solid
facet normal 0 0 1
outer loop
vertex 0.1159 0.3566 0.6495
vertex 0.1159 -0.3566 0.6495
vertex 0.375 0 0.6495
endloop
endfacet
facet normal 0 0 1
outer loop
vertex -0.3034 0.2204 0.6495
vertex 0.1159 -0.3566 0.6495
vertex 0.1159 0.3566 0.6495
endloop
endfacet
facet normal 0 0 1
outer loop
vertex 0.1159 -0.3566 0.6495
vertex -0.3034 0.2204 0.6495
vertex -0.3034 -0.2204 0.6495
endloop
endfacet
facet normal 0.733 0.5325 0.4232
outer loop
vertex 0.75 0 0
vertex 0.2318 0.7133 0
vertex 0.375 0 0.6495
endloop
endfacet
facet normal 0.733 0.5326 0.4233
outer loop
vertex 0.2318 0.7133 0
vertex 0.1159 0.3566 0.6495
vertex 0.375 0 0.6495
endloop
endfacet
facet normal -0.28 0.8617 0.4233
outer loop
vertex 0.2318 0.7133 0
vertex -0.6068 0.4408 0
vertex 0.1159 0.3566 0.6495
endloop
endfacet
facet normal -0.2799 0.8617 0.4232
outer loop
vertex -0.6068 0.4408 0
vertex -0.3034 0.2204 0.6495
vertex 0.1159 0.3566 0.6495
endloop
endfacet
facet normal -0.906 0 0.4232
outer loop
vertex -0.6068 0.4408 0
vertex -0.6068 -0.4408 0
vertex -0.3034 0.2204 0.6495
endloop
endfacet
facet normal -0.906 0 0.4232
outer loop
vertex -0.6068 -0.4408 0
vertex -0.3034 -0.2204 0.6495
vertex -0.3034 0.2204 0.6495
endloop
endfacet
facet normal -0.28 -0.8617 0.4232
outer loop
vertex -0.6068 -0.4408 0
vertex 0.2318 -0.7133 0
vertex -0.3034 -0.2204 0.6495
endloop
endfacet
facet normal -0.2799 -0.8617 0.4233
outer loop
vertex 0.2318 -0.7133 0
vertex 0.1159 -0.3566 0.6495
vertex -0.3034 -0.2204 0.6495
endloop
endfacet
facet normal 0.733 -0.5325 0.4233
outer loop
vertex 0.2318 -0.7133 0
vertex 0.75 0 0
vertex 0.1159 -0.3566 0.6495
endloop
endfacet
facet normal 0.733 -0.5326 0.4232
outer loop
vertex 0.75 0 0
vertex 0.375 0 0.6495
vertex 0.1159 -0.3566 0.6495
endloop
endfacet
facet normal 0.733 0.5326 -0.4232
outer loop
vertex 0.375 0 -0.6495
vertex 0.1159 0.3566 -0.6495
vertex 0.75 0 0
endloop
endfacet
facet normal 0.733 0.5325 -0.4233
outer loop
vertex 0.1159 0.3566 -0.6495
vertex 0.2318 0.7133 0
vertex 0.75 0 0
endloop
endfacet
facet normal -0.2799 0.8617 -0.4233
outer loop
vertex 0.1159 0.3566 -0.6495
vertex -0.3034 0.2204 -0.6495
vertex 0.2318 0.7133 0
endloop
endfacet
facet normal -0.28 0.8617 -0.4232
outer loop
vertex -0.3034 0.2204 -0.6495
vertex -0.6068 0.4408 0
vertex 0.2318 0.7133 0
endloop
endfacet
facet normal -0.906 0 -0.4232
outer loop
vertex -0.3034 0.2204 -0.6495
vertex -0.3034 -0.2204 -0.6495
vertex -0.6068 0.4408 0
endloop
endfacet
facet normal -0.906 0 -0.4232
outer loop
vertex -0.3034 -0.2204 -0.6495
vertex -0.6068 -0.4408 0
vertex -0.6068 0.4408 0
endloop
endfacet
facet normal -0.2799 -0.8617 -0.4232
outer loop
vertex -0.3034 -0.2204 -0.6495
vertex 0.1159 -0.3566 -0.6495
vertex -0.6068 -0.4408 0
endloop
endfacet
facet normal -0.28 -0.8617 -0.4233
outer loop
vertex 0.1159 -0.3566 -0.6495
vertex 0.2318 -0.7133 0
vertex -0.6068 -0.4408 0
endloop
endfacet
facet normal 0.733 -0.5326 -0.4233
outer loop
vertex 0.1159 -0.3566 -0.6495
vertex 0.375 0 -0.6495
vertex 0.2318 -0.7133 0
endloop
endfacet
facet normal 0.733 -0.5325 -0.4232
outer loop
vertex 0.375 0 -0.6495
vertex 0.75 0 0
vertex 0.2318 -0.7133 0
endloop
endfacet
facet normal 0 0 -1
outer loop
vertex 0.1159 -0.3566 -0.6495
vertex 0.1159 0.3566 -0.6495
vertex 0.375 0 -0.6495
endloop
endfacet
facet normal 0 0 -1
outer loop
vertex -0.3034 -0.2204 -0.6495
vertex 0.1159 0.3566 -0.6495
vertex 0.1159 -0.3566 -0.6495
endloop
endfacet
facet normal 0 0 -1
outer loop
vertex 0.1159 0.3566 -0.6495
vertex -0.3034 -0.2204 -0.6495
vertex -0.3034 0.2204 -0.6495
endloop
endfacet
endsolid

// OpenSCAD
// file: ContourPoints.scad
// Contour points

ViolinContour_Num_Pts = 8;

// [x_offset,scale_x,scale_y,steps,height_z]
ViolinContourPoints_Scale_X =[
  [0.0,1.0]
  ,[1.0,1.0]
  ,[2.5,1.0]
  ,[4.0,1.0]
  ,[5.25,1.0]
  ,[7.5,1.0]
  ,[10.5,1.0]
  ,[13.25,1.0]
];

function get_contour_scale_x(x) = lookup(x,ViolinContourPoints_Scale_X);

ViolinContourPoints_Scale_Y =[
  [0.0,1.0]
  ,[1.0,0.6]
  ,[2.5,0.6]
  ,[4.0,0.6]
  ,[5.25,0.6]
  ,[7.5,0.5]
  ,[10.5,0.4]
  ,[13.25,0.35]
];

function get_contour_scale_y(x) = lookup(x,ViolinContourPoints_Scale_Y);

ViolinContourPoints_Steps =[
  [0.0,8]
  ,[1.0,8]
  ,[2.5,8]
  ,[4.0,8]
  ,[5.25,8]
  ,[7.5,8]
  ,[10.5,16]
  ,[13.25,16]
];

function get_contour_steps(x) = round( lookup(x,ViolinContourPoints_Steps) );

ViolinContourPoints_Z_Height =[
  [0.0,0.25]
  ,[1.0,0.5]
  ,[2.5,0.7]
  ,[4.0,0.9]
  ,[5.25,1.1]
  ,[7.5,1.3]
  ,[10.5,1.5]
  ,[13.25,1.55]
];

function get_contour_z_height(x) = lookup(x,ViolinContourPoints_Z_Height);
// file: FHolePoints.scad
// F-Hole polynomial points;

FHole_Num_Pts = 69;
FHole = [
 [0,3.5] ,[0.05,3.3] ,[0.1,3.25] ,[0.2,3.15] ,[0.3,3.1] ,[0.4,3.05] ,[0.45,3.0] ,[0.60,3.25] ,[0.45,3.5] ,[1.2,3.8] 
,[1.4,3.5] ,[1.5,3.0] ,[1.6,2.5] ,[1.5,2.0]
,[1.45,1.5] ,[1.4,1.0] ,[1.35,0.5] ,[1.3,0.25] ,[1.2,0] ,[1.3,-0.25] ,[1.3,-0.5] ,[1.4,-1.0] ,[1.45,-1.5] ,[1.5,-2.0]
,[1.7,-2.5] ,[2.0,-3.0] ,[2.25,-3.2] ,[2.5,-3.5] ,[2.75,-3.6] ,[3.0,-3.5] ,[3.25,-3.4] ,[3.5,-3.25] ,[3.8,-3.0] ,[4.0,-2.5]
,[3.8,-2.25] ,[3.75,-2.1] ,[3.5,-1.9] ,[3.25,-2.1] ,[3.1,-2.3] ,[3.25,-2.8] ,[2.6,-3.4] ,[2.4,-3.0] ,[2.0,-2.3] ,[1.9,-2.0]
,[1.9,-1.5] ,[1.95,-1.0] ,[2.0,-0.5] ,[2.0,0.1] ,[2.2,0.3] ,[2.1,0.5] ,[2.05,0.55] ,[2.1,0.6] ,[2.15,1.0] ,[2.2,1.5]
,[2.15,2.0] ,[2.1,2.5] ,[2.0,3.0] ,[1.8,3.25] ,[1.7,3.4] ,[1.6,3.6] ,[1.5,3.75] ,[1.25,3.9] ,[1.0,3.95] ,[0.75,4.0]
,[0.6,3.95] ,[0.5,3.9] ,[0.4,3.85], [0.3,3.8] ,[0.25,3.75]
];
// file: StradPoints.scad
// Dataset copied with permission from the paper "On the Shape of a Violin", by R.J. Stroeker
// See http://www.stroeker.nl/publications.htm
//   - Stradpoints: http://www.stroeker.nl/StradPoints.pdf
// Note: All points are scale 1 unit = 1.0 cm = 10.0 mm

StradLower_Num_Pts = 44;
StradLower = [[0, 0], [0.0315332, 0.4829157], [0.0630664, 0.9869383], [0.0892593, 1.4856206], [.1836046, 2.4862911], [.2413307, 2.9849734], [.3239782, 3.4915390], [.4091687, 3.9917471], [.5452192, 4.4927181], [.6749122, 4.9916547], [.8458018, 5.4910999], [1.0439015, 5.9961397], [1.2796376, 6.4948220], [1.5580961, 6.9960473], [1.8726652, 7.4980355], [2.2836140, 7.9946834], [2.7708528, 8.5009947], [2.9778530, 8.6787504], [3.3796470, 9.0001856], [3.9851353, 9.3816356], [4.2244316, 9.5054797], [4.4896665, 9.6354270], [4.9903832, 9.8477675], [5.4549893, 10.0049249], [5.9869849, 10.1417383], [6.4871930, 10.2439669], [6.9812979, 10.3049989], [7.4764200, 10.3342434], [7.7279227, 10.3352606], [7.9812055, 10.3319547], [8.4875168, 10.2973699], [8.9938281, 10.2312519], [9.4955620, 10.1277518], [9.9515219, 10.0125539], [10.4959782, 9.8426815], [10.9880487, 9.6443275], [11.4806278, 9.4469907], [11.9861762, 9.2333787], [12.4807897, 9.0212925], [12.9863381, 8.8758329], [13.5524099, 8.8079348], [13.9938747, 8.8521830], [14.4724673, 9.0111205], [14.8249271, 9.2336330]];

StradC_Num_Pts = 29;
StradC = [[15.4128687, 8.8493857], [15.1397505, 8.5093866], [14.9813216, 8.1124243], [14.9609776, 8.0063812], [14.9480083, 7.7256340], [14.9752184, 7.5125306], [15.1400048, 7.0110510], [15.5003479, 6.5466992], [15.9934356, 6.2028856], [16.4972039, 5.9902908], [16.9897830, 5.8262673], [17.4945685, 5.7105608], [17.9975739, 5.6134182], [18.4952390, 5.5462830], [19.0015503, 5.5015262], [19.5009955, 5.4727903], [20.0062896, 5.4534635], [20.1975232, 5.4481232], [20.4968343, 5.4511748], [20.9944994, 5.4791478], [21.4921645, 5.5439943], [21.9877952, 5.6614809], [22.3918779, 5.8074491], [22.6988180, 6.0157208], [23.0098269, 6.5149117], [23.0543294, 6.8223604], [23.0428859, 7.0156284], [22.8346142, 7.5178709], [22.7944348, 7.5946695]];

StradUpper_Num_Pts = 40;
StradUpper = [[23.3900054, 7.8817742], [23.4960485, 7.7998896], [23.9934593, 7.5267714], [24.4453504, 7.4759114], [24.4984991, 7.4782001], [24.9987072, 7.5313488], [25.4994239, 7.6701966], [25.7132902, 7.7462323], [25.9968347, 7.8344744], [26.4955170, 7.9895974], [26.9952165, 8.1396344], [27.4923730, 8.2530522], [27.9961413, 8.3308680], [28.5042327, 8.3863054], [28.9525636, 8.4071580], [29.5059204, 8.3771506], [30.0061285, 8.3145928], [30.5073538, 8.2082954], [31.0047646, 8.0669046], [31.4986152, 7.8726194], [32.0031464, 7.6226425], [32.1638640, 7.5275343], [32.5061518, 7.3121422], [32.9163377, 7.0245289], [33.0155147, 6.9423900], [33.5129255, 6.5281353], [34.0047417, 6.0264014], [34.1674937, 5.8338963], [34.4047556, 5.5264476], [34.7383972, 5.0287825], [35.0168557, 4.5211997], [35.2345365, 4.0220088], [35.4234814, 3.5245980], [35.5768243, 3.0236270], [35.6971082, 2.5213845], [35.7784842, 2.0234651], [35.8412963, 1.5191882], [35.8725752, 1.0217774], [35.8774069, 0.9414186], [35.8974966, 0]];

// All Points
StradAll_Num_Pts = StradLower_Num_Pts + StradC_Num_Pts + StradUpper_Num_Pts;
StradAll = [[0, 0], [0.0315332, 0.4829157], [0.0630664, 0.9869383], [0.0892593, 1.4856206], [.1836046, 2.4862911], [.2413307, 2.9849734], [.3239782, 3.4915390], [.4091687, 3.9917471], [.5452192, 4.4927181], [.6749122, 4.9916547], [.8458018, 5.4910999], [1.0439015, 5.9961397], [1.2796376, 6.4948220], [1.5580961, 6.9960473], [1.8726652, 7.4980355], [2.2836140, 7.9946834], [2.7708528, 8.5009947], [2.9778530, 8.6787504], [3.3796470, 9.0001856], [3.9851353, 9.3816356], [4.2244316, 9.5054797], [4.4896665, 9.6354270], [4.9903832, 9.8477675], [5.4549893, 10.0049249], [5.9869849, 10.1417383], [6.4871930, 10.2439669], [6.9812979, 10.3049989], [7.4764200, 10.3342434], [7.7279227, 10.3352606], [7.9812055, 10.3319547], [8.4875168, 10.2973699], [8.9938281, 10.2312519], [9.4955620, 10.1277518], [9.9515219, 10.0125539], [10.4959782, 9.8426815], [10.9880487, 9.6443275], [11.4806278, 9.4469907], [11.9861762, 9.2333787], [12.4807897, 9.0212925], [12.9863381, 8.8758329], [13.5524099, 8.8079348], [13.9938747, 8.8521830], [14.4724673, 9.0111205], [14.8249271, 9.2336330]
// ];
// StradC = [
  ,[15.4128687, 8.8493857], [15.1397505, 8.5093866], [14.9813216, 8.1124243], [14.9609776, 8.0063812], [14.9480083, 7.7256340], [14.9752184, 7.5125306], [15.1400048, 7.0110510], [15.5003479, 6.5466992], [15.9934356, 6.2028856], [16.4972039, 5.9902908], [16.9897830, 5.8262673], [17.4945685, 5.7105608], [17.9975739, 5.6134182], [18.4952390, 5.5462830], [19.0015503, 5.5015262], [19.5009955, 5.4727903], [20.0062896, 5.4534635], [20.1975232, 5.4481232], [20.4968343, 5.4511748], [20.9944994, 5.4791478], [21.4921645, 5.5439943], [21.9877952, 5.6614809], [22.3918779, 5.8074491], [22.6988180, 6.0157208], [23.0098269, 6.5149117], [23.0543294, 6.8223604], [23.0428859, 7.0156284], [22.8346142, 7.5178709], [22.7944348, 7.5946695]
// ];
// StradUpper = [
  ,[23.3900054, 7.8817742], [23.4960485, 7.7998896], [23.9934593, 7.5267714], [24.4453504, 7.4759114], [24.4984991, 7.4782001], [24.9987072, 7.5313488], [25.4994239, 7.6701966], [25.7132902, 7.7462323], [25.9968347, 7.8344744], [26.4955170, 7.9895974], [26.9952165, 8.1396344], [27.4923730, 8.2530522], [27.9961413, 8.3308680], [28.5042327, 8.3863054], [28.9525636, 8.4071580], [29.5059204, 8.3771506], [30.0061285, 8.3145928], [30.5073538, 8.2082954], [31.0047646, 8.0669046], [31.4986152, 7.8726194], [32.0031464, 7.6226425], [32.1638640, 7.5275343], [32.5061518, 7.3121422], [32.9163377, 7.0245289], [33.0155147, 6.9423900], [33.5129255, 6.5281353], [34.0047417, 6.0264014], [34.1674937, 5.8338963], [34.4047556, 5.5264476], [34.7383972, 5.0287825], [35.0168557, 4.5211997], [35.2345365, 4.0220088], [35.4234814, 3.5245980], [35.5768243, 3.0236270], [35.6971082, 2.5213845], [35.7784842, 2.0234651], [35.8412963, 1.5191882], [35.8725752, 1.0217774], [35.8774069, 0.9414186], [35.8974966, 0]];

function get_strad_y(x) = lookup(x, StradAll);
// main file
// Basic violin form.
include <StradPoints.scad>
include <FHolePoints.scad>
include <ContourPoints.scad>

echo("Note: Default scale is 1 unit = 1.0 cm = 10.0mm");

//render_part=1; // violin_body();
//render_part=2; // violin_strad_2d();
//render_part=3; // violin_strad_all_2d();
// render_part=4; // violin_fhole_2d();
// render_part=5; //violin_strad_w_fhole_2d();
//render_part=6; // violin_strad_quantized();
// render_part=7; // violin_strad_quantized(steps=8);
//render_part=8; // violin_strad_faceted(steps=8);
//render_part=9; // Test shell_2d()
// render_part=10; // violin_purfling_2d()
// render_part=11; // violin contours.
// render_part=12; // violin_interpolated_contours.
render_part=13; // violin_minkowski_contours

module shell_2d(width=0.1,steps=8,scale_x=1.0,scale_y=1.0) {
  union() {
    for(i=[0:steps-1]) assign(rotAngle=360*i/steps) difference() {
      child(0);
      translate([scale_x*width*cos(rotAngle),scale_y*width*sin(rotAngle)]) child(0);
    }
  }
}

// End-pin is at origin
module violin_body() {
  union() {
    translate([0,67.0,0]) scale([100,67,32]) 
	cylinder($fs=0.1,$fa=5,r=1.0,h=1.0,center=false);
    translate([0,172,0]) scale([85,172,31])
	cylinder($fs=0.1,$fa=5,r=1.0,h=1.0,center=false);
    translate([0,172.0+105.0,0]) scale([80.0,70.0,30.0])
	cylinder($fs=0.1,$fa=5,r=1.0,h=1.0,center=false);
  }
}

if(render_part==1) {
  echo("Rendering violin_body()...");
  violin_body();
}

module violin_strad_2d() {
  polygon( points=StradLower, paths=[ [
	0,1,2,3,4,5,6,7,8,9,10,11,12,13,14,15,16,17,18,19
	,20,21,22,23,24,25,26,27,28,29,30,31,32,33,34,35,36,37,38,39
	,40,41,42,43
	] ], convexity=10);
  polygon( points=StradC, paths=[ [
	0,1,2,3,4,5,6,7,8,9,10,11,12,13,14,15,16,17,18,19
	,20,21,22,23,24,25,26,27,28
	] ], convexity=10);
  polygon( points=StradUpper, paths=[ [
	0,1,2,3,4,5,6,7,8,9,10,11,12,13,14,15,16,17,18,19
	,20,21,22,23,24,25,26,27,28,29,30,31,32,33,34,35,36,37,38,39
	] ], convexity=10);
}

if(render_part==2) {
  echo("Rendering violin_strad_2d()...");
  violin_strad_2d();
}

module violin_strad_half_2d() {
  // 113 points
  polygon( points=StradAll, paths=[ [
	0,1,2,3,4,5,6,7,8,9,10,11,12,13,14,15,16,17,18,19
	,20,21,22,23,24,25,26,27,28,29
	,30,31,32,33,34,35,36,37,38,39
	,40,41,42,43,44,45,46,47,48,49
	,50,51,52,53,54,55,56,57,58,59
	,60,61,62,63,64,65,66,67,68,69
	,70,71,72,73,74,75,76,77,78,79
	,80,81,82,83,84,85,86,87,88,89
	,90,91,92,93,94,95,96,97,98,99
	,100,101,102,103,104,105,106,107,108,109
	,110,111,112
	] ], convexity=10);
}

module violin_strad_all_2d() {
  union() {
    violin_strad_half_2d();
    rotate([180,0,0]) violin_strad_half_2d();
  }
}

if(render_part==3) {
  echo("Rendering violin_strad_all_2d()...");
  violin_strad_all_2d();
}

module violin_fhole_2d() {
  // 113 points
  rotate([180,0,90]) translate([2.1,StradAll[StradAll_Num_Pts-1][0]-19.5]) 
    polygon( points=FHole, paths=[ [
	0,1,2,3,4,5,6,7,8,9,10,11,12,13,14,15,16,17,18,19
	,20,21,22,23,24,25,26,27,28,29
	,30,31,32,33,34,35,36,37,38,39
	,40,41,42,43,44,45,46,47,48,49
	,50,51,52,53,54,55,56,57,58,59
	,60,61,62,63,64,65,66,67,68
	] ], convexity=10);
}

if(render_part==4) {
  echo("Rendering violin_fhole_2d()...");
  violin_fhole_2d();
}

module violin_strad_w_fhole_2d() {
  union() {
    difference() {
      violin_strad_half_2d();
	violin_fhole_2d();
    }
    rotate([180,0,0]) difference() {
      violin_strad_half_2d();
	violin_fhole_2d();
    }
  }
}

if(render_part==5) {
  echo("Rendering violin_strad_w_fhole_2d()...");
  violin_strad_w_fhole_2d();
}


module violin_strad_quantized(steps=64,height=3.0) {
  // 113 points
  firstPt_x=StradAll[0][0];
  lastPt_x=StradAll[StradAll_Num_Pts-1][0];
  step_size=(lastPt_x-firstPt_x)/steps;
  union() {
    translate([-step_size/2,-step_size/4,-height/2])
      cube(size=[lastPt_x+step_size,step_size/2,height/2], center=false);
    for(i=[0:steps-1]) assign(x_pos=step_size/2+step_size*i) translate([x_pos,0,0])
      cube(size=[step_size,2*get_strad_y(x_pos),height],center=true);
  }
}

if(render_part==6) {
  echo("Rendering violin_strad_quantized()...");
  violin_strad_quantized();
}

if(render_part==7) {
  echo("Rendering violin_strad_quantized(steps=8)...");
  violin_strad_quantized(steps=8);
}

module violin_strad_faceted(steps=64,height=3.0) {
  // 113 points
  firstPt_x=StradAll[0][0];
  lastPt_x=StradAll[StradAll_Num_Pts-1][0];
  step_size=(lastPt_x-firstPt_x)/steps;
  union() {
    translate([-step_size/2,-step_size/4,-height/2])
      cube(size=[lastPt_x+step_size,step_size/2,height/2], center=false);
    for(i=[0:steps-1]) assign(x_pos=step_size/2+step_size*i) translate([x_pos,0,0])
      cube(size=[step_size,2*get_strad_y(x_pos),height],center=true);
  }
}

if(render_part==8) {
  echo("Rendering violin_strad_faceted()...");
  violin_strad_faceted();
}

if(render_part==9) {
  echo("Testing shell_2d()...");
  shell_2d(width=1) square(size=[10,10]);
  translate([0,0,-1.0]) import_dxf("violin_strad_all_2d.dxf");
}


module violin_purfling_2d() {
  difference() {
    shell_2d(width=0.4+0.15) import_dxf("violin_strad_all_2d.dxf");
    shell_2d(width=0.4) import_dxf("violin_strad_all_2d.dxf");
  }
}

if(render_part==10) {
  echo("Rendering violin_purfling_2d()...");
  violin_purfling_2d();
}

if(render_part==11) {
  echo("Rendering violin contours...");
  union() {
   linear_extrude(height=get_contour_z_height(0.0)) import_dxf("violin_strad_all_2d.dxf");
   for(i=[1:ViolinContour_Num_Pts-1]) assign(x_coord=ViolinContourPoints_Scale_X[i][0]) {
     echo("x_coord: ",get_contour_scale_x(x_coord),get_contour_scale_y(x_coord),x_coord,get_contour_z_height(x_coord),get_contour_steps(x_coord));
     linear_extrude(height=get_contour_z_height(x_coord)) difference() {
      import_dxf("violin_strad_all_2d.dxf");
      shell_2d(width=x_coord,scale_x=get_contour_scale_x(x_coord),scale_y=get_contour_scale_y(x_coord),steps=get_contour_steps(x_coord)) 
	import_dxf("violin_strad_all_2d.dxf");
     }
   }
  }
}

module violin_interpolated_contours(num_interp_points=8) {
  union() {
   linear_extrude(height=get_contour_z_height(0.0)) import_dxf("violin_strad_all_2d.dxf");
   for(k=[1:num_interp_points]) assign(x_coord=(k*ViolinContourPoints_Scale_X[ViolinContour_Num_Pts-1][0])/num_interp_points) {
     echo("x_coord: ",x_coord,get_contour_scale_x(x_coord),get_contour_scale_y(x_coord),x_coord,get_contour_z_height(x_coord),get_contour_steps(x_coord));
     linear_extrude(height=get_contour_z_height(x_coord)) difference() {
      import_dxf("violin_strad_all_2d.dxf");
      shell_2d(width=x_coord,scale_x=get_contour_scale_x(x_coord),scale_y=get_contour_scale_y(x_coord),steps=get_contour_steps(x_coord)) 
	import_dxf("violin_strad_all_2d.dxf");
     }
   }
  }
}

if(render_part==12) {
  echo("Rendering violin_interpolated_contours(num_interp_points=8)...");
  violin_interpolated_contours(num_interp_points=8);
}

module violin_minkowski_contour() {
  minkowski() {
   linear_extrude(height=3.0) import_dxf("violin_strad_all_2d.dxf");
    sphere(r=3.0/4);
  }
}

if(render_part==13) {
  echo("Rendering violin_minkowski_contour()...");
  violin_minkowski_contour();
}
